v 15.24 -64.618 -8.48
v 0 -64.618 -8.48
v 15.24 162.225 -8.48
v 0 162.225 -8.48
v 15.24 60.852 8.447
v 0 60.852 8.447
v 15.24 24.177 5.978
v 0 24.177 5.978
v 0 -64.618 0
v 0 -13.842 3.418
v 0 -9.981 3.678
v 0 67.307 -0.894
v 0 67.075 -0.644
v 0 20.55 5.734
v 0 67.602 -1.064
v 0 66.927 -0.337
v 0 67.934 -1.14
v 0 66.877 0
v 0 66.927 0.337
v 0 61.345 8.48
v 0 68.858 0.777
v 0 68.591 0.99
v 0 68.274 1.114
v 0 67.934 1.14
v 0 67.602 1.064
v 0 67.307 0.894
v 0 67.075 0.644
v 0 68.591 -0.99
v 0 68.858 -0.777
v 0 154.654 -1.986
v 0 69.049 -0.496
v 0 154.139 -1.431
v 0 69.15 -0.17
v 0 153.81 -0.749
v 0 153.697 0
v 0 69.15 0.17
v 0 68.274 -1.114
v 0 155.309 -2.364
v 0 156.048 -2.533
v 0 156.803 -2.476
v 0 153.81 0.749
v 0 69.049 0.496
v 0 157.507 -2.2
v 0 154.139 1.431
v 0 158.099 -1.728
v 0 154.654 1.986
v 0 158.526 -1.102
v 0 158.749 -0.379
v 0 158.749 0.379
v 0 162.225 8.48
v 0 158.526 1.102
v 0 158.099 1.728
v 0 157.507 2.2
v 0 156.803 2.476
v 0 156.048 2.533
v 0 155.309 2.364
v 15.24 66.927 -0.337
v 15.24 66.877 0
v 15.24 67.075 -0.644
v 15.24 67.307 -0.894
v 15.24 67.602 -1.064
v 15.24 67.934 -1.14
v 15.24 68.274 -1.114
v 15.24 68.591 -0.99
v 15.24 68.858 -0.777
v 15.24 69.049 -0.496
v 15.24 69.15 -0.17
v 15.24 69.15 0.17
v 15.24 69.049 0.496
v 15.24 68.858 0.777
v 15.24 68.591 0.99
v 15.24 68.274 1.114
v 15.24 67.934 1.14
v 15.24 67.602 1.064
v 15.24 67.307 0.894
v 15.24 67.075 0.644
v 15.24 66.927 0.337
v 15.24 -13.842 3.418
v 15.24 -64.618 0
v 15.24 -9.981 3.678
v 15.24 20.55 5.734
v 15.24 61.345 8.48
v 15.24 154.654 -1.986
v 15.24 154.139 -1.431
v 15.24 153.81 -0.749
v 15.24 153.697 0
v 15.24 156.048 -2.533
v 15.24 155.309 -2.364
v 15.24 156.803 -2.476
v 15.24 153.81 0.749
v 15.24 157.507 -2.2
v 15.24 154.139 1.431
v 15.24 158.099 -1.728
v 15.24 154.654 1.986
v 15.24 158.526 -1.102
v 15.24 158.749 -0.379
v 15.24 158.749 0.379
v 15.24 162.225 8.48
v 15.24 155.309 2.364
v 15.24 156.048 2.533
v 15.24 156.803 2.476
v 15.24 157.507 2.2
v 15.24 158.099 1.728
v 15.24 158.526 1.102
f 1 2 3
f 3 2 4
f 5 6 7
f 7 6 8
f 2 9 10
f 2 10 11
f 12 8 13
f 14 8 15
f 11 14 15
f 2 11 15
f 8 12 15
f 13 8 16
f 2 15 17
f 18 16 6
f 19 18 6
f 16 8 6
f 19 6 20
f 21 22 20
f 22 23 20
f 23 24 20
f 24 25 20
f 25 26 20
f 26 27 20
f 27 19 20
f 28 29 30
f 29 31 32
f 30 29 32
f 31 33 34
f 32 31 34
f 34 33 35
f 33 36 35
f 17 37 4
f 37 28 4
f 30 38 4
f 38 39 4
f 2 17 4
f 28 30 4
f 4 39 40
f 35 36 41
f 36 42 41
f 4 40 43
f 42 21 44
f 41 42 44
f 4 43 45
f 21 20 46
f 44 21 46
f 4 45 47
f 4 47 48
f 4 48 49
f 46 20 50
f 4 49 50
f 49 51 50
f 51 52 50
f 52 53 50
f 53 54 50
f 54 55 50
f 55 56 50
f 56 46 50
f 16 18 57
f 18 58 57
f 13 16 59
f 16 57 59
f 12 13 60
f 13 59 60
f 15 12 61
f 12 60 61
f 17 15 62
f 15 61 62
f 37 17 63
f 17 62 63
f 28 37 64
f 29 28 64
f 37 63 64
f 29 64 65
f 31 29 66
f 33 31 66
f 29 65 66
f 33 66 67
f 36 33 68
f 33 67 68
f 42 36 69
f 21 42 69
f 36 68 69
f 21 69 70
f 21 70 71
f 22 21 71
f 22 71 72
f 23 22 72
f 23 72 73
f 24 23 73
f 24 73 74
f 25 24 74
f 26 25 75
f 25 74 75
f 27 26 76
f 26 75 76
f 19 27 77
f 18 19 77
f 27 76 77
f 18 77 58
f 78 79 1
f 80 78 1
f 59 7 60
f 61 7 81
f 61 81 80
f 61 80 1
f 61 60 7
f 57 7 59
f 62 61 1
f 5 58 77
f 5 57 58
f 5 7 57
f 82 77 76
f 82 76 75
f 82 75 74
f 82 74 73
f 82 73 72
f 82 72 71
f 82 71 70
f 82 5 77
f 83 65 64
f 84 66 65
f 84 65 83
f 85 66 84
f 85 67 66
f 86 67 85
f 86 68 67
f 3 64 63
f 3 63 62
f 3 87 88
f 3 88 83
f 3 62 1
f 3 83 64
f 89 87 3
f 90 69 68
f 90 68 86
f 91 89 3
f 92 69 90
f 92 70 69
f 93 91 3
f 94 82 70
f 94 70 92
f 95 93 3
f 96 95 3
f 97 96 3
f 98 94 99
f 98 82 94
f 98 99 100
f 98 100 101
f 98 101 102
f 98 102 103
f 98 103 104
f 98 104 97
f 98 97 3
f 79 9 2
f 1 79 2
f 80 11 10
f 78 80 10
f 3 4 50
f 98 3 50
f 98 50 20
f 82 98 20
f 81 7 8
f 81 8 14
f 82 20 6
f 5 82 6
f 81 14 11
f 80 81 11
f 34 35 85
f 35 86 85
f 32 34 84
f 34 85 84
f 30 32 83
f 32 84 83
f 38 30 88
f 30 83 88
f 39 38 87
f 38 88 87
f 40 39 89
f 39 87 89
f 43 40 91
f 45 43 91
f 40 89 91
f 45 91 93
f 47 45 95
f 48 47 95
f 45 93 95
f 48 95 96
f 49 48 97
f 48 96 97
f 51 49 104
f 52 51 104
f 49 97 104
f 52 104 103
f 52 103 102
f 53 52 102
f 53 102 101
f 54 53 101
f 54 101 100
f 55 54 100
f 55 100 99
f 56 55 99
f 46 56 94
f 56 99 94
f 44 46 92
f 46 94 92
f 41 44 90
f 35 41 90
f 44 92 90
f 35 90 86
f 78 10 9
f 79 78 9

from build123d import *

# Parameters (mm, degrees)
F1_DEPTH = 15.24
F2_D     = 2.286
F2_DEPTH = 15.24
F2_TIP   = 0.6867836875
F3_D     = 5.08
F3_DEPTH = 15.24
F3_TIP   = 1.5261859723
F4_DEPTH = 15.24
F0_W     = 74.4793638587
F0_H     = 6.2680644915
F0_H_2   = 5.8993548155
F5_DEPTH = 15.24


with BuildPart() as f1:
    # F0 (on Right) → F1 (new body)
    with BuildSketch(Plane.YZ):
        Polygon((60.8523078263, 8.4471310302), (60.8523078263, -8.4803225473), (73.919005692, -8.4803225473), (73.919005692, -2.2122580558), (148.3983695507, -2.2122580558), (148.3983695507, -8.4803225473), (162.2249782085, -8.4803225473), (162.2249782085, 8.4803225473), (148.3983695507, 8.4803225473), (148.3983695507, 2.5809677318), (73.919005692, 2.5809677318), (73.919005692, 8.4803225473), (61.3453197977, 8.4803225473), align=None)
    extrude(amount=F1_DEPTH)

    # F2
    with Locations(Plane(origin=(0, 0, 0), x_dir=(0, 1, 0), z_dir=(-1, 0, 0))):
        with Locations((68.0196508765, 0)):
            Hole(F2_D / 2, depth=F2_DEPTH)
            with Locations((0, 0, -(F2_DEPTH + F2_TIP / 2))):  # 118° drill point
                Cone(0, F2_D / 2, F2_TIP, mode=Mode.SUBTRACT)

    # F3
    with Locations(Plane(origin=(0, 0, 0), x_dir=(0, 1, 0), z_dir=(-1, 0, 0))):
        with Locations((156.2374085188, 0)):
            Hole(F3_D / 2, depth=F3_DEPTH)
            with Locations((0, 0, -(F3_DEPTH + F3_TIP / 2))):  # 118° drill point
                Cone(0, F3_D / 2, F3_TIP, mode=Mode.SUBTRACT)

    # F0 (on Right) → F4 (join)
    with BuildSketch(Plane.YZ):
        Polygon((-64.6176040173, 0), (-64.6176040173, -8.4803225473), (-54.0782185303, -8.4803225473), (-54.0782185303, 0.7095531421), align=None)
        Polygon((-54.0782185303, 0.7095531421), (-54.0782185303, -8.4803225473), (-13.8418450952, -8.4803225473), (-13.8418450952, 3.4184250429), align=None)
        Polygon((-13.8418450952, 3.4184250429), (-13.8418450952, -8.4803225473), (-9.9811125547, -8.4803225473), (-9.9811125547, 3.6783448369), align=None)
        Polygon((-9.9811125547, 3.6783448369), (-9.9811125547, -8.4803225473), (20.5496044121, -8.4803225473), (20.5496044121, 5.7337935327), align=None)
        Polygon((24.1768896074, 5.9779967275), (24.1768896074, -8.4803225473), (60.8523078263, -8.4803225473), (60.8523078263, 8.4471310302), align=None)
        Polygon((20.5496044121, 5.7337935327), (20.5496044121, -8.4803225473), (24.1768896074, -8.4803225473), (24.1768896074, 5.9779967275), align=None)
    extrude(amount=F4_DEPTH)

    # F0 (on Right) → F5 (join)
    with BuildSketch(Plane.YZ):
        with Locations((111.1586876214, -5.3462903015)):
            Rectangle(F0_W, F0_H)
        with Locations((111.1586876214, 5.5306451395)):
            Rectangle(F0_W, F0_H_2)
    extrude(amount=F5_DEPTH)


solid = f1.part
